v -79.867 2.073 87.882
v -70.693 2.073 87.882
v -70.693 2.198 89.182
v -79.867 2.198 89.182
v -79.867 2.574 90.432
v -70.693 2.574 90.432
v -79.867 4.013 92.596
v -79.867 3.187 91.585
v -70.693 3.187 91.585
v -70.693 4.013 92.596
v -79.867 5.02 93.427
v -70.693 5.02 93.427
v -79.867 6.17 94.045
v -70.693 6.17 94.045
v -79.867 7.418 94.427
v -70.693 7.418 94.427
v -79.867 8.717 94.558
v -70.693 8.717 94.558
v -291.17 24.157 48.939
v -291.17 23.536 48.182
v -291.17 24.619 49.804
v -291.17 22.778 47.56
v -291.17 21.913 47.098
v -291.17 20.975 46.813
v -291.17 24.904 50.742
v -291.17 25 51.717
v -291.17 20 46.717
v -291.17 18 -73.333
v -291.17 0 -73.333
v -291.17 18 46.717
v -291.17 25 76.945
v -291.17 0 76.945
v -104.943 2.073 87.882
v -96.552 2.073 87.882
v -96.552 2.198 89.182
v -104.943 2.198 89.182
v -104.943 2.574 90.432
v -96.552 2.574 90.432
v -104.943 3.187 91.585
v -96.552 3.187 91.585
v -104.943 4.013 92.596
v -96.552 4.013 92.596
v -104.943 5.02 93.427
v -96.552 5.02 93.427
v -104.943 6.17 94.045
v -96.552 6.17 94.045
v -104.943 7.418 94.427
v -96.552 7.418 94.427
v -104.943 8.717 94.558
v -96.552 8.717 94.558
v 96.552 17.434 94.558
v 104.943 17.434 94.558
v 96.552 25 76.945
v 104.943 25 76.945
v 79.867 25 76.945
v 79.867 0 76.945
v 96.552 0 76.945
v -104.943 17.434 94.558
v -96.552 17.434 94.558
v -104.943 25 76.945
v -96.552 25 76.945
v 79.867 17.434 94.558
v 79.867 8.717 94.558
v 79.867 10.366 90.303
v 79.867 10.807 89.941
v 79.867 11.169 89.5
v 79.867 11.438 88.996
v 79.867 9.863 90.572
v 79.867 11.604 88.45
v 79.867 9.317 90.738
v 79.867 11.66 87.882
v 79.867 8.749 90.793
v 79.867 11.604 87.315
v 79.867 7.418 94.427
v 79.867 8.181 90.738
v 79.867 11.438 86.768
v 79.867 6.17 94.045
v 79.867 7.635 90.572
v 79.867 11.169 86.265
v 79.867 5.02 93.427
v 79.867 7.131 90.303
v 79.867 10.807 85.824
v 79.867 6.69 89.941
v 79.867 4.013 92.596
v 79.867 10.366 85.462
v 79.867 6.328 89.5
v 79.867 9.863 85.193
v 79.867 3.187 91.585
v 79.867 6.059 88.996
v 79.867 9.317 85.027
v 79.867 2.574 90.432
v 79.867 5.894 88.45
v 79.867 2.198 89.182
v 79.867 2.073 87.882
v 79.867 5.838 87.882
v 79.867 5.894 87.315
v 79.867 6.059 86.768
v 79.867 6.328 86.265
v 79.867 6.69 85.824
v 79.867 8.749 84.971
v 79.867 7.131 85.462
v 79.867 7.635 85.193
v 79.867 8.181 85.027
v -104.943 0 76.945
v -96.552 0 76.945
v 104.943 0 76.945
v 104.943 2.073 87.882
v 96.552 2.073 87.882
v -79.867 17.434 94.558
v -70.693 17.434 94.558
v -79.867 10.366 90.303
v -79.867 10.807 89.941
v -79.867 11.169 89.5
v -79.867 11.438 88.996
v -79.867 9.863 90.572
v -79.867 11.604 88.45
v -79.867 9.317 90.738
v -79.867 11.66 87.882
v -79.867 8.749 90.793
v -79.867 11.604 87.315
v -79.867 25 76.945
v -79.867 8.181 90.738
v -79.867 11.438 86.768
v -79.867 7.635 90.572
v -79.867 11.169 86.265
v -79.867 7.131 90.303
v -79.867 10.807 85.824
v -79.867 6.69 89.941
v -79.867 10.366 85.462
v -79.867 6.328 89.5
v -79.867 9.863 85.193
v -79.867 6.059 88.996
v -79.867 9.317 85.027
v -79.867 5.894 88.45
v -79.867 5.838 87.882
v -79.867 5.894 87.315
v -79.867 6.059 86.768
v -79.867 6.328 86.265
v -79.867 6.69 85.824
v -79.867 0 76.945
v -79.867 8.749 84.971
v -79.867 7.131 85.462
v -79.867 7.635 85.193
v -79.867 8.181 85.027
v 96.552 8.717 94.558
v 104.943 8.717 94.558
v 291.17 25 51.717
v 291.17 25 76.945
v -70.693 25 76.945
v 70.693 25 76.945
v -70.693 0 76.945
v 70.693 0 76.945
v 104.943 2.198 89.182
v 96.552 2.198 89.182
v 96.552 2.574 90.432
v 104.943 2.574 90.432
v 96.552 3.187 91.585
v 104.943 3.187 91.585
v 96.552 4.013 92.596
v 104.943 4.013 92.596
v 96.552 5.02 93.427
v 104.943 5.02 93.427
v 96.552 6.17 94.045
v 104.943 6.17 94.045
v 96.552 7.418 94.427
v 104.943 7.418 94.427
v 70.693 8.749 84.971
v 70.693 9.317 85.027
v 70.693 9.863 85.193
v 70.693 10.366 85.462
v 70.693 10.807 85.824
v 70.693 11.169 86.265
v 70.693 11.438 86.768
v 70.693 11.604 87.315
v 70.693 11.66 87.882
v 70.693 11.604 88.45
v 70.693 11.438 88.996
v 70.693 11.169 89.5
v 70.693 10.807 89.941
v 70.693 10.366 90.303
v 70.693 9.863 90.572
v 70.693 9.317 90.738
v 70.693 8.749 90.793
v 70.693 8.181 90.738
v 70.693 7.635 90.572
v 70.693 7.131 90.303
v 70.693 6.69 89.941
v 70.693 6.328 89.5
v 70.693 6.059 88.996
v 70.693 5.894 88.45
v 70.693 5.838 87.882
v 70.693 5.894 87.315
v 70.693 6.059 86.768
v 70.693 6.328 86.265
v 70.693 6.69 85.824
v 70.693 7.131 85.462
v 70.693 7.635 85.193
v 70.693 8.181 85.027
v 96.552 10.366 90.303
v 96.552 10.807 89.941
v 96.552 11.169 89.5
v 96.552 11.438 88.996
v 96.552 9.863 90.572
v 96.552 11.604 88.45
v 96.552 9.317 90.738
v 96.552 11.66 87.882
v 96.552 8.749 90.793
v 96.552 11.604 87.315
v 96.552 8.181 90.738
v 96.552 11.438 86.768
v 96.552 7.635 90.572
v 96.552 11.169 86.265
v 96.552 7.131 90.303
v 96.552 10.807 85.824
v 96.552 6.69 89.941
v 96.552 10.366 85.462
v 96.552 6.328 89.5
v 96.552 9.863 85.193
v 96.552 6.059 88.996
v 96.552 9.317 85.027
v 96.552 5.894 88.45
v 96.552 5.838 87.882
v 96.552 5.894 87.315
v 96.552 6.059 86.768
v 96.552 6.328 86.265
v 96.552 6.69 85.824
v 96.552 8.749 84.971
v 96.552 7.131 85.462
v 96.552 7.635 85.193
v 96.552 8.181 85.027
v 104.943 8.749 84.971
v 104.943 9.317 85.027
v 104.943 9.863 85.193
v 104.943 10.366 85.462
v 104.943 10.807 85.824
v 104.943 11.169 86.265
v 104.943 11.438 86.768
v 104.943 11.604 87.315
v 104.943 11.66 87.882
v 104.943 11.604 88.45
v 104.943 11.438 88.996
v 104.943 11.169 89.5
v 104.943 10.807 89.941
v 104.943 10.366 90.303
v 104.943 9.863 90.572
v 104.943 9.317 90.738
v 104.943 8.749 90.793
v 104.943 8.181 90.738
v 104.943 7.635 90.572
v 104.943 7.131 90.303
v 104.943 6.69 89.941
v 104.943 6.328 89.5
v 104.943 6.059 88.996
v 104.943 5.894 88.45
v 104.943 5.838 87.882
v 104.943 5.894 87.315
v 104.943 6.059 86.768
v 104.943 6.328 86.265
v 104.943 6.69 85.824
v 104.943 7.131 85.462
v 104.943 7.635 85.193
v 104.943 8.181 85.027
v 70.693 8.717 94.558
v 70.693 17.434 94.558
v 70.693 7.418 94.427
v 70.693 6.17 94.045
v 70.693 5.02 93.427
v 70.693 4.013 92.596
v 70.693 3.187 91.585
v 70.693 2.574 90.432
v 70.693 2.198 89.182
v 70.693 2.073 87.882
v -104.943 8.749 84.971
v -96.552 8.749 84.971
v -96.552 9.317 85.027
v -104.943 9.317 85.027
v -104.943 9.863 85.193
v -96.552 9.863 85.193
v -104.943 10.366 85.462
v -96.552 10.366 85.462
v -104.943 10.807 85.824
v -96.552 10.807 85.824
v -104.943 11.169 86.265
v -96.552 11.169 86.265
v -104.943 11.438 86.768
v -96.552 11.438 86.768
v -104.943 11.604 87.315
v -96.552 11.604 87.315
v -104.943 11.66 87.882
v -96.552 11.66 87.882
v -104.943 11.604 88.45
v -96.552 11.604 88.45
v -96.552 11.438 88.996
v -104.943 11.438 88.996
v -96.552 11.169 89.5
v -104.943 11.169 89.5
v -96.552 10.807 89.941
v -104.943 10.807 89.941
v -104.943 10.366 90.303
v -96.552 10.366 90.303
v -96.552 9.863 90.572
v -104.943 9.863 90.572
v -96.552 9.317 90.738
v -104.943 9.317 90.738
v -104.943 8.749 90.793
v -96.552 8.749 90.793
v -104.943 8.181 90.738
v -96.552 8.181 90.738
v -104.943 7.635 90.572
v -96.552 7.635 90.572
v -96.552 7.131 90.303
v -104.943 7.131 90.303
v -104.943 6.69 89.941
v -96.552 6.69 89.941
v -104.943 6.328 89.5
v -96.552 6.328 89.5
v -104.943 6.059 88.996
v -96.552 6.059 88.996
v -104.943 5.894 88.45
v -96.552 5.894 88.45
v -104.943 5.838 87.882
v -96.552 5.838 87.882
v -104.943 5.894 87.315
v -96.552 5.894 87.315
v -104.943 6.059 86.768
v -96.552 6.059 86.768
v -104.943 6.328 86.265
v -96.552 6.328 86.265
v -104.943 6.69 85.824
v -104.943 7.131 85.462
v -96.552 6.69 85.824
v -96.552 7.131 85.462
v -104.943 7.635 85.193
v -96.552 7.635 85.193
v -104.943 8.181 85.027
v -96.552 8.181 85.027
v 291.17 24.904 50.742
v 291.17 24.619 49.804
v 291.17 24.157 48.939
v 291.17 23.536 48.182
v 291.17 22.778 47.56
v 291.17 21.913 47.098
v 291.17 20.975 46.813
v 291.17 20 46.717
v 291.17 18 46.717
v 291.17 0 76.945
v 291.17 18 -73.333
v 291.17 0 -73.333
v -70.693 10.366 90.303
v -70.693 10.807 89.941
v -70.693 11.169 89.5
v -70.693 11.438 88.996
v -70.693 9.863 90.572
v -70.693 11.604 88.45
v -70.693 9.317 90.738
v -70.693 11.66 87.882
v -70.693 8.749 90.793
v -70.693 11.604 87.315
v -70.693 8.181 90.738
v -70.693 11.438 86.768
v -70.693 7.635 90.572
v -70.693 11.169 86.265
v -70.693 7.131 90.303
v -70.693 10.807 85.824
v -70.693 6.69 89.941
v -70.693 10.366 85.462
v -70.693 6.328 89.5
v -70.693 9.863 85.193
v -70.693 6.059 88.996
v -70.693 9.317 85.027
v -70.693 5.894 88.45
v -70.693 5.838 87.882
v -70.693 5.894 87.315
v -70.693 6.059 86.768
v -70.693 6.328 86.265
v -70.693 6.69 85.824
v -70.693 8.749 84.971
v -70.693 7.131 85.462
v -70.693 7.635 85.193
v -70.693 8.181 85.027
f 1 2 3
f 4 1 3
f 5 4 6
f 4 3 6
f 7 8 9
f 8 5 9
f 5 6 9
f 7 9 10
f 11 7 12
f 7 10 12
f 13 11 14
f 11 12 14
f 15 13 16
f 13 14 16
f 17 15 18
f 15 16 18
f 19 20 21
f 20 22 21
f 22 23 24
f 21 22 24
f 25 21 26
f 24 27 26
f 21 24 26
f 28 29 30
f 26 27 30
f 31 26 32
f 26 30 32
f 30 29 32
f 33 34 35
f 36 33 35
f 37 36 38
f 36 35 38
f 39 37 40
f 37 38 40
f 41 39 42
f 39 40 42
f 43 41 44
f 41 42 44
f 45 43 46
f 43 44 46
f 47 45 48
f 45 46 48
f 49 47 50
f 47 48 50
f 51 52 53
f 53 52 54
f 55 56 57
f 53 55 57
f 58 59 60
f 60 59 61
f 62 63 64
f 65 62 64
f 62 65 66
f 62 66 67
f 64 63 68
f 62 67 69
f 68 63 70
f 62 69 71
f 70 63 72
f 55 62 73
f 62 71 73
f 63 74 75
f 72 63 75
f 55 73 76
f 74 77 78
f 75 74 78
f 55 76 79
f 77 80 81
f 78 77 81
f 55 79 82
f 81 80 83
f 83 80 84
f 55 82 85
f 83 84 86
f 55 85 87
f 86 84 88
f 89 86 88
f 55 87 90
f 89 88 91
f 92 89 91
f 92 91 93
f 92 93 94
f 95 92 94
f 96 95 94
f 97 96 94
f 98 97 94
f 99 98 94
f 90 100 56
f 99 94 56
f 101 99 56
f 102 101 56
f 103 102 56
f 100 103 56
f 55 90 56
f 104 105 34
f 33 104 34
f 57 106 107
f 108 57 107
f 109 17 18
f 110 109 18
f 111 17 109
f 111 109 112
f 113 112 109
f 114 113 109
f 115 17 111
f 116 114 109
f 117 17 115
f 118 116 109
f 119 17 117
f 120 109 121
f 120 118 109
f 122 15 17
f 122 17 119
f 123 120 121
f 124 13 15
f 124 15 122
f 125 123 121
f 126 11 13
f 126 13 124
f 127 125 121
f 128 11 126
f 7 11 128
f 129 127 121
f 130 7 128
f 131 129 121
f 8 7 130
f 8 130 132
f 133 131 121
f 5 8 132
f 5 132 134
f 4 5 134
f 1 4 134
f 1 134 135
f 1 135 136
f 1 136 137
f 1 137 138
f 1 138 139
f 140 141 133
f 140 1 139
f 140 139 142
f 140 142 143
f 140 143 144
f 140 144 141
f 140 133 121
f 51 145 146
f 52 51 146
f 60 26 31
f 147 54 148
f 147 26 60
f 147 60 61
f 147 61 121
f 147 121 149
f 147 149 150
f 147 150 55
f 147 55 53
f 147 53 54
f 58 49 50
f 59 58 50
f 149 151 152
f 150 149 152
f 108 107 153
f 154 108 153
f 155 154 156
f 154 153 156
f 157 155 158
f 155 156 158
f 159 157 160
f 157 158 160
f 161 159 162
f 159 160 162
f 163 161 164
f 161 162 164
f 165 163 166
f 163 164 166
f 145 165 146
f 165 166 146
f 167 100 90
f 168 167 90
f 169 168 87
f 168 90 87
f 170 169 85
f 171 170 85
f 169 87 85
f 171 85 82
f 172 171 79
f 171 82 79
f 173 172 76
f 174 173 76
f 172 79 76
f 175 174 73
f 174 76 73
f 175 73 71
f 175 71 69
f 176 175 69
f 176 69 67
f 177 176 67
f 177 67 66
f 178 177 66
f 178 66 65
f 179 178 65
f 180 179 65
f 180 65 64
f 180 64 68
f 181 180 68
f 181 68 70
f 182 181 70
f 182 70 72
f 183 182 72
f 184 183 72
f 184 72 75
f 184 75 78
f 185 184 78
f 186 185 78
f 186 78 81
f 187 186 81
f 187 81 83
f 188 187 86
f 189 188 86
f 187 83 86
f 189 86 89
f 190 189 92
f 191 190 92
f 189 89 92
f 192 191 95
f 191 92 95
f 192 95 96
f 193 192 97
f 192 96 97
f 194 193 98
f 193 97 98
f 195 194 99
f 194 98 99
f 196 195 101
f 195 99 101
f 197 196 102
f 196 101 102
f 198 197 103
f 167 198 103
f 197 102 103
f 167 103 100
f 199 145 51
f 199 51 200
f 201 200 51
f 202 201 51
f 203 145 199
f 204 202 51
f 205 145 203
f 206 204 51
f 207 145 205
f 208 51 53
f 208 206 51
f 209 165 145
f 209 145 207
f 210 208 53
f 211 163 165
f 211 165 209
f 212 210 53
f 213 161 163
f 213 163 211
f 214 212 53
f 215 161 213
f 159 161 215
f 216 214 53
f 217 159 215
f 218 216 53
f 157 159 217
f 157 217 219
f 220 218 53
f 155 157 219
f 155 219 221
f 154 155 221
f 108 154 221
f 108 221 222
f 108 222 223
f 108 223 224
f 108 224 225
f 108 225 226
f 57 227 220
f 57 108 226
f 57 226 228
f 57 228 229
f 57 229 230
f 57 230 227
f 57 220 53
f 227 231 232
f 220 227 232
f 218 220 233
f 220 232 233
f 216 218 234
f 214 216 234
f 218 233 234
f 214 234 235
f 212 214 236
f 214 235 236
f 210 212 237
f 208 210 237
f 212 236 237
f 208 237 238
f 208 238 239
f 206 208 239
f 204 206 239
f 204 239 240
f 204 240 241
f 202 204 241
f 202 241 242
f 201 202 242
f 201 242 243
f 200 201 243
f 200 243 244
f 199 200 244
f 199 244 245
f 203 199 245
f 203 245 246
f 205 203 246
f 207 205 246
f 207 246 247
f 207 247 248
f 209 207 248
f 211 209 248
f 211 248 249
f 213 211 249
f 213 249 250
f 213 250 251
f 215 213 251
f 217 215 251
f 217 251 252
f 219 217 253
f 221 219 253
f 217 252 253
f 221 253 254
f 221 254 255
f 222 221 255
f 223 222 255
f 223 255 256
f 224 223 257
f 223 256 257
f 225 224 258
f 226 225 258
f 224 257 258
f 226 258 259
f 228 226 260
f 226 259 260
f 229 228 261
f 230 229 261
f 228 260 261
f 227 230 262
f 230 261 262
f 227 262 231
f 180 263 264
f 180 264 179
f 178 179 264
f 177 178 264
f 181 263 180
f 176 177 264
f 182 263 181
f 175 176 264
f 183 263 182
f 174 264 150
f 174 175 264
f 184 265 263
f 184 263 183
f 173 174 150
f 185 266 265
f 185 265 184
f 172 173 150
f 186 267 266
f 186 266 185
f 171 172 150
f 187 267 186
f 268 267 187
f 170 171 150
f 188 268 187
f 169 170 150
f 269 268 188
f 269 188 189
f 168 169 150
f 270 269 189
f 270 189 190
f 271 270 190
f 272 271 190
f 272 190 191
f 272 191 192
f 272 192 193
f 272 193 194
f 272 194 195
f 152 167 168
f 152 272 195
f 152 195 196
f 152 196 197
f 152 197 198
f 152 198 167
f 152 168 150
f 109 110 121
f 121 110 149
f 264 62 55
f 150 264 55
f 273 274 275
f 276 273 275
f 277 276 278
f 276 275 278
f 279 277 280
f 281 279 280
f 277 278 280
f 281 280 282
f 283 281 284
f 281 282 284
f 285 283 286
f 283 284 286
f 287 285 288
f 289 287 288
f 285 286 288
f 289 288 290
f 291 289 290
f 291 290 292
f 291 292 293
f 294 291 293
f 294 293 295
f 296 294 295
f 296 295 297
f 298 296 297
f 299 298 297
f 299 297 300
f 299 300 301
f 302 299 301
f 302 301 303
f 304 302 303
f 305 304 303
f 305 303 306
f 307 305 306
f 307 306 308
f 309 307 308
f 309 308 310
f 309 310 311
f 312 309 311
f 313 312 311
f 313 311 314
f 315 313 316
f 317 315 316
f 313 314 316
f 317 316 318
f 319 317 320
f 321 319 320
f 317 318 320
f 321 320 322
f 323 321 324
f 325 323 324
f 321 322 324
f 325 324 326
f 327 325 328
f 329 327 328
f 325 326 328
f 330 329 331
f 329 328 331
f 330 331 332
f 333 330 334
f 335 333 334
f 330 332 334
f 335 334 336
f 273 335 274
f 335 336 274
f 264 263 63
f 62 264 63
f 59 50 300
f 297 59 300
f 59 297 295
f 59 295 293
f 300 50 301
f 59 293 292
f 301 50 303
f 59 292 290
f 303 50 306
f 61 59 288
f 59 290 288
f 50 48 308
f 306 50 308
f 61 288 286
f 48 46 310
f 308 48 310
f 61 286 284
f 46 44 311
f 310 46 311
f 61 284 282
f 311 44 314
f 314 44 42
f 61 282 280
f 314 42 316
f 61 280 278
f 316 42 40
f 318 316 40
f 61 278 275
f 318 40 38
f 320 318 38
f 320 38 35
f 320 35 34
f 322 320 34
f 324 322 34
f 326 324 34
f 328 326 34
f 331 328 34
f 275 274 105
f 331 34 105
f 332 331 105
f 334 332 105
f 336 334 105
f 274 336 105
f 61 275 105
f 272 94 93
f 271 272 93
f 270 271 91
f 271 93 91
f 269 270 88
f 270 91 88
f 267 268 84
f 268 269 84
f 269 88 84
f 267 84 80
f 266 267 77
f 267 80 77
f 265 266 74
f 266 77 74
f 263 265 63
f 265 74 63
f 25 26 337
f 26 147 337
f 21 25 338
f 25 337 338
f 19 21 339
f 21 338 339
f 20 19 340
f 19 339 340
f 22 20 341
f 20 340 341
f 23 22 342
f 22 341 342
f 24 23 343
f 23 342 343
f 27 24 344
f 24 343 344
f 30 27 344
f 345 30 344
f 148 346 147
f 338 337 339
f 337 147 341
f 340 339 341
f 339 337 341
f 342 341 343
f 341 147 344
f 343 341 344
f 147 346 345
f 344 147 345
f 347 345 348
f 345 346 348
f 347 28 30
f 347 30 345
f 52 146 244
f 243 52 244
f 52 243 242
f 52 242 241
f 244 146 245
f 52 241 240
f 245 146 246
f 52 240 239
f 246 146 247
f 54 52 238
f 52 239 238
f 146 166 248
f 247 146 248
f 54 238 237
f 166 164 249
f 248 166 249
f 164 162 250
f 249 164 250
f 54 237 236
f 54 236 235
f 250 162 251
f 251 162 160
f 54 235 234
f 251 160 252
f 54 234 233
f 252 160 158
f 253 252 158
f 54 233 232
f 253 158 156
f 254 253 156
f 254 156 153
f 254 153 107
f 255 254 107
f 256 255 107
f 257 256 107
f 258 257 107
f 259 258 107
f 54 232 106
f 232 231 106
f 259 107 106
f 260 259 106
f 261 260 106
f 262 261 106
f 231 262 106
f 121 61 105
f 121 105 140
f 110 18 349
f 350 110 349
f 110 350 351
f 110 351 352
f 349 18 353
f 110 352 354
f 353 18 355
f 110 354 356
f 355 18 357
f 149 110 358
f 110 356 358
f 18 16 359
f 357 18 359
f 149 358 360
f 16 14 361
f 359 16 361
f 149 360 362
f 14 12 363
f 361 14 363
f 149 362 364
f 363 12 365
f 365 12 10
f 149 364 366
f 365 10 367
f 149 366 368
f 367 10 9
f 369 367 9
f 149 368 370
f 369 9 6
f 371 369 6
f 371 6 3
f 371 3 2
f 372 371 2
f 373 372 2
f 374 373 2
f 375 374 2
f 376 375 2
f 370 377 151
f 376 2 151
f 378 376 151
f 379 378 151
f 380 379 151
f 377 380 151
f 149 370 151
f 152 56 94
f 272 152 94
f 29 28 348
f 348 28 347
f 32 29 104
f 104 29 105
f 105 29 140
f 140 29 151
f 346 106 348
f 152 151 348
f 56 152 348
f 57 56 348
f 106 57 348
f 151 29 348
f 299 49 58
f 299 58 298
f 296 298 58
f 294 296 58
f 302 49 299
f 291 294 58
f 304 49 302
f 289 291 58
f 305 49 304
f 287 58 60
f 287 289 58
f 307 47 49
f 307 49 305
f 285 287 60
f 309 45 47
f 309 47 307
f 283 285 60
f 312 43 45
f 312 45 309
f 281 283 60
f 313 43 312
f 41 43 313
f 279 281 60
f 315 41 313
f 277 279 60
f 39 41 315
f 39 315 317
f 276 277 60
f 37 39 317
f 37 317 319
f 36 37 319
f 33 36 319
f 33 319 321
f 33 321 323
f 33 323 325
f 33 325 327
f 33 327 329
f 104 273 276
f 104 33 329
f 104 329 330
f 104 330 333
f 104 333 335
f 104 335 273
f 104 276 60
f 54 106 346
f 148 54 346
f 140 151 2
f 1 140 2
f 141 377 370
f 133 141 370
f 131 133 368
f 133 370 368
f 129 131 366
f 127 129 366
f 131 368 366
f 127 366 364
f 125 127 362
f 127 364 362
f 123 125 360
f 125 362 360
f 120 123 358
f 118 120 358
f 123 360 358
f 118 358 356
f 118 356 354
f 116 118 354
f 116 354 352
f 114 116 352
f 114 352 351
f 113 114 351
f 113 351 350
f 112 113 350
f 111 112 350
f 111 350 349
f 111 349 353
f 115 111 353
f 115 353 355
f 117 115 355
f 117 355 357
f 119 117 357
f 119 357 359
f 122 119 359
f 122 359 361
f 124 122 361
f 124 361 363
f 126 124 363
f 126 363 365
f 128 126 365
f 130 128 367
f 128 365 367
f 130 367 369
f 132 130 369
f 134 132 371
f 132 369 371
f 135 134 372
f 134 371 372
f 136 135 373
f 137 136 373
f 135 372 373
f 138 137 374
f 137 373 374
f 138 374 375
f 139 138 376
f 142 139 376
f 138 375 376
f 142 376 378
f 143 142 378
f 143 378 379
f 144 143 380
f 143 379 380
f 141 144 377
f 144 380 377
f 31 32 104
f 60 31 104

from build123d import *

# Parameters (mm, degrees)
SKETCH1_W           = 8.39079
SKETCH1_H           = 17.612704871
SKETCH1_W_2         = 9.17363
BOSS_EXTRUDE1_DEPTH = 25
SKETCH2_R           = 2.9110285
CUT_EXTRUDE1_DEPTH  = 409.009554619
CUT_EXTRUDE2_DEPTH  = 409.009554619
SKETCH4_W           = 582.34
SKETCH4_H           = 123.66999206
CUT_EXTRUDE3_DEPTH  = 7
FILLET1_R           = 5
SKETCH5_W           = 582.34
SKETCH5_H           = 3.612357777
CUT_EXTRUDE4_DEPTH  = 307.667781892


with BuildPart() as part:
    # Sketch1 → Boss-Extrude1 (new body)
    with BuildSketch(Plane(origin=(0, 0, 0), x_dir=(1, 0, 0), z_dir=(0, 1, 0))):
        Polygon((291.17, 76.945), (-291.17, 76.945), (-291.17, -76.945), (-104.943162, -76.945), (-96.552372, -76.945), (-79.86659, -76.945), (-70.69296, -76.945), (70.69296, -76.945), (79.86659, -76.945), (96.552372, -76.945), (104.943162, -76.945), (291.17, -76.945), align=None)
        with Locations((100.747767, -85.751352436)):
            Rectangle(SKETCH1_W, SKETCH1_H)
        with Locations((75.279775, -85.751352436)):
            Rectangle(SKETCH1_W_2, SKETCH1_H)
        with Locations((-75.279775, -85.751352436)):
            Rectangle(SKETCH1_W_2, SKETCH1_H)
        with Locations((-100.747767, -85.751352436)):
            Rectangle(SKETCH1_W, SKETCH1_H)
    extrude(amount=BOSS_EXTRUDE1_DEPTH)

    # Sketch2 → Cut-Extrude1 (cut, through all)
    with BuildSketch(Plane(origin=(104.943162, 0, 0), x_dir=(0, 0, -1), z_dir=(1, 0, 0))):
        with Locations((-87.882438934, 8.748719463)):
            Circle(SKETCH2_R)
    extrude(amount=-CUT_EXTRUDE1_DEPTH, mode=Mode.SUBTRACT)

    # Sketch3 → Cut-Extrude2 (cut, through all)
    with BuildSketch(Plane(origin=(104.943162, 0, 0), x_dir=(0, 0, -1), z_dir=(1, 0, 0))):
        with BuildLine():
            Line((-76.945, 0), (-87.882438934, 2.073453526))
            ThreePointArc((-87.882438934, 2.073453526), (-92.59600701, 4.012761881), (-94.557704871, 8.717055919))
            Line((-94.557704871, 8.717055919), (-94.557704871, 0))
            Line((-94.557704871, 0), (-76.945, 0))
        make_face()
        Polygon((-94.557704871, 17.434111839), (-76.945, 25), (-94.557704871, 25), align=None)
    extrude(amount=-CUT_EXTRUDE2_DEPTH, mode=Mode.SUBTRACT)

    # Sketch4 → Cut-Extrude3 (cut)
    with BuildSketch(Plane(origin=(0, 25, 0), x_dir=(1, 0, 0), z_dir=(0, 1, 0))):
        with Locations((0, 15.117928008)):
            Rectangle(SKETCH4_W, SKETCH4_H)
    extrude(amount=-CUT_EXTRUDE3_DEPTH, mode=Mode.SUBTRACT)

    # Fillet1
    fillet1_edges = [part.edges().sort_by_distance(p)[0] for p in [
        (0, 25, 46.717068022),
    ]]
    fillet(fillet1_edges, radius=FILLET1_R)

    # Sketch5 → Cut-Extrude4 (cut, through all)
    with BuildSketch(Plane(origin=(0, 18, 0), x_dir=(1, 0, 0), z_dir=(0, 1, 0))):
        with Locations((0, 75.138821112)):
            Rectangle(SKETCH5_W, SKETCH5_H)
    extrude(amount=-CUT_EXTRUDE4_DEPTH, mode=Mode.SUBTRACT)


solid = part.part
